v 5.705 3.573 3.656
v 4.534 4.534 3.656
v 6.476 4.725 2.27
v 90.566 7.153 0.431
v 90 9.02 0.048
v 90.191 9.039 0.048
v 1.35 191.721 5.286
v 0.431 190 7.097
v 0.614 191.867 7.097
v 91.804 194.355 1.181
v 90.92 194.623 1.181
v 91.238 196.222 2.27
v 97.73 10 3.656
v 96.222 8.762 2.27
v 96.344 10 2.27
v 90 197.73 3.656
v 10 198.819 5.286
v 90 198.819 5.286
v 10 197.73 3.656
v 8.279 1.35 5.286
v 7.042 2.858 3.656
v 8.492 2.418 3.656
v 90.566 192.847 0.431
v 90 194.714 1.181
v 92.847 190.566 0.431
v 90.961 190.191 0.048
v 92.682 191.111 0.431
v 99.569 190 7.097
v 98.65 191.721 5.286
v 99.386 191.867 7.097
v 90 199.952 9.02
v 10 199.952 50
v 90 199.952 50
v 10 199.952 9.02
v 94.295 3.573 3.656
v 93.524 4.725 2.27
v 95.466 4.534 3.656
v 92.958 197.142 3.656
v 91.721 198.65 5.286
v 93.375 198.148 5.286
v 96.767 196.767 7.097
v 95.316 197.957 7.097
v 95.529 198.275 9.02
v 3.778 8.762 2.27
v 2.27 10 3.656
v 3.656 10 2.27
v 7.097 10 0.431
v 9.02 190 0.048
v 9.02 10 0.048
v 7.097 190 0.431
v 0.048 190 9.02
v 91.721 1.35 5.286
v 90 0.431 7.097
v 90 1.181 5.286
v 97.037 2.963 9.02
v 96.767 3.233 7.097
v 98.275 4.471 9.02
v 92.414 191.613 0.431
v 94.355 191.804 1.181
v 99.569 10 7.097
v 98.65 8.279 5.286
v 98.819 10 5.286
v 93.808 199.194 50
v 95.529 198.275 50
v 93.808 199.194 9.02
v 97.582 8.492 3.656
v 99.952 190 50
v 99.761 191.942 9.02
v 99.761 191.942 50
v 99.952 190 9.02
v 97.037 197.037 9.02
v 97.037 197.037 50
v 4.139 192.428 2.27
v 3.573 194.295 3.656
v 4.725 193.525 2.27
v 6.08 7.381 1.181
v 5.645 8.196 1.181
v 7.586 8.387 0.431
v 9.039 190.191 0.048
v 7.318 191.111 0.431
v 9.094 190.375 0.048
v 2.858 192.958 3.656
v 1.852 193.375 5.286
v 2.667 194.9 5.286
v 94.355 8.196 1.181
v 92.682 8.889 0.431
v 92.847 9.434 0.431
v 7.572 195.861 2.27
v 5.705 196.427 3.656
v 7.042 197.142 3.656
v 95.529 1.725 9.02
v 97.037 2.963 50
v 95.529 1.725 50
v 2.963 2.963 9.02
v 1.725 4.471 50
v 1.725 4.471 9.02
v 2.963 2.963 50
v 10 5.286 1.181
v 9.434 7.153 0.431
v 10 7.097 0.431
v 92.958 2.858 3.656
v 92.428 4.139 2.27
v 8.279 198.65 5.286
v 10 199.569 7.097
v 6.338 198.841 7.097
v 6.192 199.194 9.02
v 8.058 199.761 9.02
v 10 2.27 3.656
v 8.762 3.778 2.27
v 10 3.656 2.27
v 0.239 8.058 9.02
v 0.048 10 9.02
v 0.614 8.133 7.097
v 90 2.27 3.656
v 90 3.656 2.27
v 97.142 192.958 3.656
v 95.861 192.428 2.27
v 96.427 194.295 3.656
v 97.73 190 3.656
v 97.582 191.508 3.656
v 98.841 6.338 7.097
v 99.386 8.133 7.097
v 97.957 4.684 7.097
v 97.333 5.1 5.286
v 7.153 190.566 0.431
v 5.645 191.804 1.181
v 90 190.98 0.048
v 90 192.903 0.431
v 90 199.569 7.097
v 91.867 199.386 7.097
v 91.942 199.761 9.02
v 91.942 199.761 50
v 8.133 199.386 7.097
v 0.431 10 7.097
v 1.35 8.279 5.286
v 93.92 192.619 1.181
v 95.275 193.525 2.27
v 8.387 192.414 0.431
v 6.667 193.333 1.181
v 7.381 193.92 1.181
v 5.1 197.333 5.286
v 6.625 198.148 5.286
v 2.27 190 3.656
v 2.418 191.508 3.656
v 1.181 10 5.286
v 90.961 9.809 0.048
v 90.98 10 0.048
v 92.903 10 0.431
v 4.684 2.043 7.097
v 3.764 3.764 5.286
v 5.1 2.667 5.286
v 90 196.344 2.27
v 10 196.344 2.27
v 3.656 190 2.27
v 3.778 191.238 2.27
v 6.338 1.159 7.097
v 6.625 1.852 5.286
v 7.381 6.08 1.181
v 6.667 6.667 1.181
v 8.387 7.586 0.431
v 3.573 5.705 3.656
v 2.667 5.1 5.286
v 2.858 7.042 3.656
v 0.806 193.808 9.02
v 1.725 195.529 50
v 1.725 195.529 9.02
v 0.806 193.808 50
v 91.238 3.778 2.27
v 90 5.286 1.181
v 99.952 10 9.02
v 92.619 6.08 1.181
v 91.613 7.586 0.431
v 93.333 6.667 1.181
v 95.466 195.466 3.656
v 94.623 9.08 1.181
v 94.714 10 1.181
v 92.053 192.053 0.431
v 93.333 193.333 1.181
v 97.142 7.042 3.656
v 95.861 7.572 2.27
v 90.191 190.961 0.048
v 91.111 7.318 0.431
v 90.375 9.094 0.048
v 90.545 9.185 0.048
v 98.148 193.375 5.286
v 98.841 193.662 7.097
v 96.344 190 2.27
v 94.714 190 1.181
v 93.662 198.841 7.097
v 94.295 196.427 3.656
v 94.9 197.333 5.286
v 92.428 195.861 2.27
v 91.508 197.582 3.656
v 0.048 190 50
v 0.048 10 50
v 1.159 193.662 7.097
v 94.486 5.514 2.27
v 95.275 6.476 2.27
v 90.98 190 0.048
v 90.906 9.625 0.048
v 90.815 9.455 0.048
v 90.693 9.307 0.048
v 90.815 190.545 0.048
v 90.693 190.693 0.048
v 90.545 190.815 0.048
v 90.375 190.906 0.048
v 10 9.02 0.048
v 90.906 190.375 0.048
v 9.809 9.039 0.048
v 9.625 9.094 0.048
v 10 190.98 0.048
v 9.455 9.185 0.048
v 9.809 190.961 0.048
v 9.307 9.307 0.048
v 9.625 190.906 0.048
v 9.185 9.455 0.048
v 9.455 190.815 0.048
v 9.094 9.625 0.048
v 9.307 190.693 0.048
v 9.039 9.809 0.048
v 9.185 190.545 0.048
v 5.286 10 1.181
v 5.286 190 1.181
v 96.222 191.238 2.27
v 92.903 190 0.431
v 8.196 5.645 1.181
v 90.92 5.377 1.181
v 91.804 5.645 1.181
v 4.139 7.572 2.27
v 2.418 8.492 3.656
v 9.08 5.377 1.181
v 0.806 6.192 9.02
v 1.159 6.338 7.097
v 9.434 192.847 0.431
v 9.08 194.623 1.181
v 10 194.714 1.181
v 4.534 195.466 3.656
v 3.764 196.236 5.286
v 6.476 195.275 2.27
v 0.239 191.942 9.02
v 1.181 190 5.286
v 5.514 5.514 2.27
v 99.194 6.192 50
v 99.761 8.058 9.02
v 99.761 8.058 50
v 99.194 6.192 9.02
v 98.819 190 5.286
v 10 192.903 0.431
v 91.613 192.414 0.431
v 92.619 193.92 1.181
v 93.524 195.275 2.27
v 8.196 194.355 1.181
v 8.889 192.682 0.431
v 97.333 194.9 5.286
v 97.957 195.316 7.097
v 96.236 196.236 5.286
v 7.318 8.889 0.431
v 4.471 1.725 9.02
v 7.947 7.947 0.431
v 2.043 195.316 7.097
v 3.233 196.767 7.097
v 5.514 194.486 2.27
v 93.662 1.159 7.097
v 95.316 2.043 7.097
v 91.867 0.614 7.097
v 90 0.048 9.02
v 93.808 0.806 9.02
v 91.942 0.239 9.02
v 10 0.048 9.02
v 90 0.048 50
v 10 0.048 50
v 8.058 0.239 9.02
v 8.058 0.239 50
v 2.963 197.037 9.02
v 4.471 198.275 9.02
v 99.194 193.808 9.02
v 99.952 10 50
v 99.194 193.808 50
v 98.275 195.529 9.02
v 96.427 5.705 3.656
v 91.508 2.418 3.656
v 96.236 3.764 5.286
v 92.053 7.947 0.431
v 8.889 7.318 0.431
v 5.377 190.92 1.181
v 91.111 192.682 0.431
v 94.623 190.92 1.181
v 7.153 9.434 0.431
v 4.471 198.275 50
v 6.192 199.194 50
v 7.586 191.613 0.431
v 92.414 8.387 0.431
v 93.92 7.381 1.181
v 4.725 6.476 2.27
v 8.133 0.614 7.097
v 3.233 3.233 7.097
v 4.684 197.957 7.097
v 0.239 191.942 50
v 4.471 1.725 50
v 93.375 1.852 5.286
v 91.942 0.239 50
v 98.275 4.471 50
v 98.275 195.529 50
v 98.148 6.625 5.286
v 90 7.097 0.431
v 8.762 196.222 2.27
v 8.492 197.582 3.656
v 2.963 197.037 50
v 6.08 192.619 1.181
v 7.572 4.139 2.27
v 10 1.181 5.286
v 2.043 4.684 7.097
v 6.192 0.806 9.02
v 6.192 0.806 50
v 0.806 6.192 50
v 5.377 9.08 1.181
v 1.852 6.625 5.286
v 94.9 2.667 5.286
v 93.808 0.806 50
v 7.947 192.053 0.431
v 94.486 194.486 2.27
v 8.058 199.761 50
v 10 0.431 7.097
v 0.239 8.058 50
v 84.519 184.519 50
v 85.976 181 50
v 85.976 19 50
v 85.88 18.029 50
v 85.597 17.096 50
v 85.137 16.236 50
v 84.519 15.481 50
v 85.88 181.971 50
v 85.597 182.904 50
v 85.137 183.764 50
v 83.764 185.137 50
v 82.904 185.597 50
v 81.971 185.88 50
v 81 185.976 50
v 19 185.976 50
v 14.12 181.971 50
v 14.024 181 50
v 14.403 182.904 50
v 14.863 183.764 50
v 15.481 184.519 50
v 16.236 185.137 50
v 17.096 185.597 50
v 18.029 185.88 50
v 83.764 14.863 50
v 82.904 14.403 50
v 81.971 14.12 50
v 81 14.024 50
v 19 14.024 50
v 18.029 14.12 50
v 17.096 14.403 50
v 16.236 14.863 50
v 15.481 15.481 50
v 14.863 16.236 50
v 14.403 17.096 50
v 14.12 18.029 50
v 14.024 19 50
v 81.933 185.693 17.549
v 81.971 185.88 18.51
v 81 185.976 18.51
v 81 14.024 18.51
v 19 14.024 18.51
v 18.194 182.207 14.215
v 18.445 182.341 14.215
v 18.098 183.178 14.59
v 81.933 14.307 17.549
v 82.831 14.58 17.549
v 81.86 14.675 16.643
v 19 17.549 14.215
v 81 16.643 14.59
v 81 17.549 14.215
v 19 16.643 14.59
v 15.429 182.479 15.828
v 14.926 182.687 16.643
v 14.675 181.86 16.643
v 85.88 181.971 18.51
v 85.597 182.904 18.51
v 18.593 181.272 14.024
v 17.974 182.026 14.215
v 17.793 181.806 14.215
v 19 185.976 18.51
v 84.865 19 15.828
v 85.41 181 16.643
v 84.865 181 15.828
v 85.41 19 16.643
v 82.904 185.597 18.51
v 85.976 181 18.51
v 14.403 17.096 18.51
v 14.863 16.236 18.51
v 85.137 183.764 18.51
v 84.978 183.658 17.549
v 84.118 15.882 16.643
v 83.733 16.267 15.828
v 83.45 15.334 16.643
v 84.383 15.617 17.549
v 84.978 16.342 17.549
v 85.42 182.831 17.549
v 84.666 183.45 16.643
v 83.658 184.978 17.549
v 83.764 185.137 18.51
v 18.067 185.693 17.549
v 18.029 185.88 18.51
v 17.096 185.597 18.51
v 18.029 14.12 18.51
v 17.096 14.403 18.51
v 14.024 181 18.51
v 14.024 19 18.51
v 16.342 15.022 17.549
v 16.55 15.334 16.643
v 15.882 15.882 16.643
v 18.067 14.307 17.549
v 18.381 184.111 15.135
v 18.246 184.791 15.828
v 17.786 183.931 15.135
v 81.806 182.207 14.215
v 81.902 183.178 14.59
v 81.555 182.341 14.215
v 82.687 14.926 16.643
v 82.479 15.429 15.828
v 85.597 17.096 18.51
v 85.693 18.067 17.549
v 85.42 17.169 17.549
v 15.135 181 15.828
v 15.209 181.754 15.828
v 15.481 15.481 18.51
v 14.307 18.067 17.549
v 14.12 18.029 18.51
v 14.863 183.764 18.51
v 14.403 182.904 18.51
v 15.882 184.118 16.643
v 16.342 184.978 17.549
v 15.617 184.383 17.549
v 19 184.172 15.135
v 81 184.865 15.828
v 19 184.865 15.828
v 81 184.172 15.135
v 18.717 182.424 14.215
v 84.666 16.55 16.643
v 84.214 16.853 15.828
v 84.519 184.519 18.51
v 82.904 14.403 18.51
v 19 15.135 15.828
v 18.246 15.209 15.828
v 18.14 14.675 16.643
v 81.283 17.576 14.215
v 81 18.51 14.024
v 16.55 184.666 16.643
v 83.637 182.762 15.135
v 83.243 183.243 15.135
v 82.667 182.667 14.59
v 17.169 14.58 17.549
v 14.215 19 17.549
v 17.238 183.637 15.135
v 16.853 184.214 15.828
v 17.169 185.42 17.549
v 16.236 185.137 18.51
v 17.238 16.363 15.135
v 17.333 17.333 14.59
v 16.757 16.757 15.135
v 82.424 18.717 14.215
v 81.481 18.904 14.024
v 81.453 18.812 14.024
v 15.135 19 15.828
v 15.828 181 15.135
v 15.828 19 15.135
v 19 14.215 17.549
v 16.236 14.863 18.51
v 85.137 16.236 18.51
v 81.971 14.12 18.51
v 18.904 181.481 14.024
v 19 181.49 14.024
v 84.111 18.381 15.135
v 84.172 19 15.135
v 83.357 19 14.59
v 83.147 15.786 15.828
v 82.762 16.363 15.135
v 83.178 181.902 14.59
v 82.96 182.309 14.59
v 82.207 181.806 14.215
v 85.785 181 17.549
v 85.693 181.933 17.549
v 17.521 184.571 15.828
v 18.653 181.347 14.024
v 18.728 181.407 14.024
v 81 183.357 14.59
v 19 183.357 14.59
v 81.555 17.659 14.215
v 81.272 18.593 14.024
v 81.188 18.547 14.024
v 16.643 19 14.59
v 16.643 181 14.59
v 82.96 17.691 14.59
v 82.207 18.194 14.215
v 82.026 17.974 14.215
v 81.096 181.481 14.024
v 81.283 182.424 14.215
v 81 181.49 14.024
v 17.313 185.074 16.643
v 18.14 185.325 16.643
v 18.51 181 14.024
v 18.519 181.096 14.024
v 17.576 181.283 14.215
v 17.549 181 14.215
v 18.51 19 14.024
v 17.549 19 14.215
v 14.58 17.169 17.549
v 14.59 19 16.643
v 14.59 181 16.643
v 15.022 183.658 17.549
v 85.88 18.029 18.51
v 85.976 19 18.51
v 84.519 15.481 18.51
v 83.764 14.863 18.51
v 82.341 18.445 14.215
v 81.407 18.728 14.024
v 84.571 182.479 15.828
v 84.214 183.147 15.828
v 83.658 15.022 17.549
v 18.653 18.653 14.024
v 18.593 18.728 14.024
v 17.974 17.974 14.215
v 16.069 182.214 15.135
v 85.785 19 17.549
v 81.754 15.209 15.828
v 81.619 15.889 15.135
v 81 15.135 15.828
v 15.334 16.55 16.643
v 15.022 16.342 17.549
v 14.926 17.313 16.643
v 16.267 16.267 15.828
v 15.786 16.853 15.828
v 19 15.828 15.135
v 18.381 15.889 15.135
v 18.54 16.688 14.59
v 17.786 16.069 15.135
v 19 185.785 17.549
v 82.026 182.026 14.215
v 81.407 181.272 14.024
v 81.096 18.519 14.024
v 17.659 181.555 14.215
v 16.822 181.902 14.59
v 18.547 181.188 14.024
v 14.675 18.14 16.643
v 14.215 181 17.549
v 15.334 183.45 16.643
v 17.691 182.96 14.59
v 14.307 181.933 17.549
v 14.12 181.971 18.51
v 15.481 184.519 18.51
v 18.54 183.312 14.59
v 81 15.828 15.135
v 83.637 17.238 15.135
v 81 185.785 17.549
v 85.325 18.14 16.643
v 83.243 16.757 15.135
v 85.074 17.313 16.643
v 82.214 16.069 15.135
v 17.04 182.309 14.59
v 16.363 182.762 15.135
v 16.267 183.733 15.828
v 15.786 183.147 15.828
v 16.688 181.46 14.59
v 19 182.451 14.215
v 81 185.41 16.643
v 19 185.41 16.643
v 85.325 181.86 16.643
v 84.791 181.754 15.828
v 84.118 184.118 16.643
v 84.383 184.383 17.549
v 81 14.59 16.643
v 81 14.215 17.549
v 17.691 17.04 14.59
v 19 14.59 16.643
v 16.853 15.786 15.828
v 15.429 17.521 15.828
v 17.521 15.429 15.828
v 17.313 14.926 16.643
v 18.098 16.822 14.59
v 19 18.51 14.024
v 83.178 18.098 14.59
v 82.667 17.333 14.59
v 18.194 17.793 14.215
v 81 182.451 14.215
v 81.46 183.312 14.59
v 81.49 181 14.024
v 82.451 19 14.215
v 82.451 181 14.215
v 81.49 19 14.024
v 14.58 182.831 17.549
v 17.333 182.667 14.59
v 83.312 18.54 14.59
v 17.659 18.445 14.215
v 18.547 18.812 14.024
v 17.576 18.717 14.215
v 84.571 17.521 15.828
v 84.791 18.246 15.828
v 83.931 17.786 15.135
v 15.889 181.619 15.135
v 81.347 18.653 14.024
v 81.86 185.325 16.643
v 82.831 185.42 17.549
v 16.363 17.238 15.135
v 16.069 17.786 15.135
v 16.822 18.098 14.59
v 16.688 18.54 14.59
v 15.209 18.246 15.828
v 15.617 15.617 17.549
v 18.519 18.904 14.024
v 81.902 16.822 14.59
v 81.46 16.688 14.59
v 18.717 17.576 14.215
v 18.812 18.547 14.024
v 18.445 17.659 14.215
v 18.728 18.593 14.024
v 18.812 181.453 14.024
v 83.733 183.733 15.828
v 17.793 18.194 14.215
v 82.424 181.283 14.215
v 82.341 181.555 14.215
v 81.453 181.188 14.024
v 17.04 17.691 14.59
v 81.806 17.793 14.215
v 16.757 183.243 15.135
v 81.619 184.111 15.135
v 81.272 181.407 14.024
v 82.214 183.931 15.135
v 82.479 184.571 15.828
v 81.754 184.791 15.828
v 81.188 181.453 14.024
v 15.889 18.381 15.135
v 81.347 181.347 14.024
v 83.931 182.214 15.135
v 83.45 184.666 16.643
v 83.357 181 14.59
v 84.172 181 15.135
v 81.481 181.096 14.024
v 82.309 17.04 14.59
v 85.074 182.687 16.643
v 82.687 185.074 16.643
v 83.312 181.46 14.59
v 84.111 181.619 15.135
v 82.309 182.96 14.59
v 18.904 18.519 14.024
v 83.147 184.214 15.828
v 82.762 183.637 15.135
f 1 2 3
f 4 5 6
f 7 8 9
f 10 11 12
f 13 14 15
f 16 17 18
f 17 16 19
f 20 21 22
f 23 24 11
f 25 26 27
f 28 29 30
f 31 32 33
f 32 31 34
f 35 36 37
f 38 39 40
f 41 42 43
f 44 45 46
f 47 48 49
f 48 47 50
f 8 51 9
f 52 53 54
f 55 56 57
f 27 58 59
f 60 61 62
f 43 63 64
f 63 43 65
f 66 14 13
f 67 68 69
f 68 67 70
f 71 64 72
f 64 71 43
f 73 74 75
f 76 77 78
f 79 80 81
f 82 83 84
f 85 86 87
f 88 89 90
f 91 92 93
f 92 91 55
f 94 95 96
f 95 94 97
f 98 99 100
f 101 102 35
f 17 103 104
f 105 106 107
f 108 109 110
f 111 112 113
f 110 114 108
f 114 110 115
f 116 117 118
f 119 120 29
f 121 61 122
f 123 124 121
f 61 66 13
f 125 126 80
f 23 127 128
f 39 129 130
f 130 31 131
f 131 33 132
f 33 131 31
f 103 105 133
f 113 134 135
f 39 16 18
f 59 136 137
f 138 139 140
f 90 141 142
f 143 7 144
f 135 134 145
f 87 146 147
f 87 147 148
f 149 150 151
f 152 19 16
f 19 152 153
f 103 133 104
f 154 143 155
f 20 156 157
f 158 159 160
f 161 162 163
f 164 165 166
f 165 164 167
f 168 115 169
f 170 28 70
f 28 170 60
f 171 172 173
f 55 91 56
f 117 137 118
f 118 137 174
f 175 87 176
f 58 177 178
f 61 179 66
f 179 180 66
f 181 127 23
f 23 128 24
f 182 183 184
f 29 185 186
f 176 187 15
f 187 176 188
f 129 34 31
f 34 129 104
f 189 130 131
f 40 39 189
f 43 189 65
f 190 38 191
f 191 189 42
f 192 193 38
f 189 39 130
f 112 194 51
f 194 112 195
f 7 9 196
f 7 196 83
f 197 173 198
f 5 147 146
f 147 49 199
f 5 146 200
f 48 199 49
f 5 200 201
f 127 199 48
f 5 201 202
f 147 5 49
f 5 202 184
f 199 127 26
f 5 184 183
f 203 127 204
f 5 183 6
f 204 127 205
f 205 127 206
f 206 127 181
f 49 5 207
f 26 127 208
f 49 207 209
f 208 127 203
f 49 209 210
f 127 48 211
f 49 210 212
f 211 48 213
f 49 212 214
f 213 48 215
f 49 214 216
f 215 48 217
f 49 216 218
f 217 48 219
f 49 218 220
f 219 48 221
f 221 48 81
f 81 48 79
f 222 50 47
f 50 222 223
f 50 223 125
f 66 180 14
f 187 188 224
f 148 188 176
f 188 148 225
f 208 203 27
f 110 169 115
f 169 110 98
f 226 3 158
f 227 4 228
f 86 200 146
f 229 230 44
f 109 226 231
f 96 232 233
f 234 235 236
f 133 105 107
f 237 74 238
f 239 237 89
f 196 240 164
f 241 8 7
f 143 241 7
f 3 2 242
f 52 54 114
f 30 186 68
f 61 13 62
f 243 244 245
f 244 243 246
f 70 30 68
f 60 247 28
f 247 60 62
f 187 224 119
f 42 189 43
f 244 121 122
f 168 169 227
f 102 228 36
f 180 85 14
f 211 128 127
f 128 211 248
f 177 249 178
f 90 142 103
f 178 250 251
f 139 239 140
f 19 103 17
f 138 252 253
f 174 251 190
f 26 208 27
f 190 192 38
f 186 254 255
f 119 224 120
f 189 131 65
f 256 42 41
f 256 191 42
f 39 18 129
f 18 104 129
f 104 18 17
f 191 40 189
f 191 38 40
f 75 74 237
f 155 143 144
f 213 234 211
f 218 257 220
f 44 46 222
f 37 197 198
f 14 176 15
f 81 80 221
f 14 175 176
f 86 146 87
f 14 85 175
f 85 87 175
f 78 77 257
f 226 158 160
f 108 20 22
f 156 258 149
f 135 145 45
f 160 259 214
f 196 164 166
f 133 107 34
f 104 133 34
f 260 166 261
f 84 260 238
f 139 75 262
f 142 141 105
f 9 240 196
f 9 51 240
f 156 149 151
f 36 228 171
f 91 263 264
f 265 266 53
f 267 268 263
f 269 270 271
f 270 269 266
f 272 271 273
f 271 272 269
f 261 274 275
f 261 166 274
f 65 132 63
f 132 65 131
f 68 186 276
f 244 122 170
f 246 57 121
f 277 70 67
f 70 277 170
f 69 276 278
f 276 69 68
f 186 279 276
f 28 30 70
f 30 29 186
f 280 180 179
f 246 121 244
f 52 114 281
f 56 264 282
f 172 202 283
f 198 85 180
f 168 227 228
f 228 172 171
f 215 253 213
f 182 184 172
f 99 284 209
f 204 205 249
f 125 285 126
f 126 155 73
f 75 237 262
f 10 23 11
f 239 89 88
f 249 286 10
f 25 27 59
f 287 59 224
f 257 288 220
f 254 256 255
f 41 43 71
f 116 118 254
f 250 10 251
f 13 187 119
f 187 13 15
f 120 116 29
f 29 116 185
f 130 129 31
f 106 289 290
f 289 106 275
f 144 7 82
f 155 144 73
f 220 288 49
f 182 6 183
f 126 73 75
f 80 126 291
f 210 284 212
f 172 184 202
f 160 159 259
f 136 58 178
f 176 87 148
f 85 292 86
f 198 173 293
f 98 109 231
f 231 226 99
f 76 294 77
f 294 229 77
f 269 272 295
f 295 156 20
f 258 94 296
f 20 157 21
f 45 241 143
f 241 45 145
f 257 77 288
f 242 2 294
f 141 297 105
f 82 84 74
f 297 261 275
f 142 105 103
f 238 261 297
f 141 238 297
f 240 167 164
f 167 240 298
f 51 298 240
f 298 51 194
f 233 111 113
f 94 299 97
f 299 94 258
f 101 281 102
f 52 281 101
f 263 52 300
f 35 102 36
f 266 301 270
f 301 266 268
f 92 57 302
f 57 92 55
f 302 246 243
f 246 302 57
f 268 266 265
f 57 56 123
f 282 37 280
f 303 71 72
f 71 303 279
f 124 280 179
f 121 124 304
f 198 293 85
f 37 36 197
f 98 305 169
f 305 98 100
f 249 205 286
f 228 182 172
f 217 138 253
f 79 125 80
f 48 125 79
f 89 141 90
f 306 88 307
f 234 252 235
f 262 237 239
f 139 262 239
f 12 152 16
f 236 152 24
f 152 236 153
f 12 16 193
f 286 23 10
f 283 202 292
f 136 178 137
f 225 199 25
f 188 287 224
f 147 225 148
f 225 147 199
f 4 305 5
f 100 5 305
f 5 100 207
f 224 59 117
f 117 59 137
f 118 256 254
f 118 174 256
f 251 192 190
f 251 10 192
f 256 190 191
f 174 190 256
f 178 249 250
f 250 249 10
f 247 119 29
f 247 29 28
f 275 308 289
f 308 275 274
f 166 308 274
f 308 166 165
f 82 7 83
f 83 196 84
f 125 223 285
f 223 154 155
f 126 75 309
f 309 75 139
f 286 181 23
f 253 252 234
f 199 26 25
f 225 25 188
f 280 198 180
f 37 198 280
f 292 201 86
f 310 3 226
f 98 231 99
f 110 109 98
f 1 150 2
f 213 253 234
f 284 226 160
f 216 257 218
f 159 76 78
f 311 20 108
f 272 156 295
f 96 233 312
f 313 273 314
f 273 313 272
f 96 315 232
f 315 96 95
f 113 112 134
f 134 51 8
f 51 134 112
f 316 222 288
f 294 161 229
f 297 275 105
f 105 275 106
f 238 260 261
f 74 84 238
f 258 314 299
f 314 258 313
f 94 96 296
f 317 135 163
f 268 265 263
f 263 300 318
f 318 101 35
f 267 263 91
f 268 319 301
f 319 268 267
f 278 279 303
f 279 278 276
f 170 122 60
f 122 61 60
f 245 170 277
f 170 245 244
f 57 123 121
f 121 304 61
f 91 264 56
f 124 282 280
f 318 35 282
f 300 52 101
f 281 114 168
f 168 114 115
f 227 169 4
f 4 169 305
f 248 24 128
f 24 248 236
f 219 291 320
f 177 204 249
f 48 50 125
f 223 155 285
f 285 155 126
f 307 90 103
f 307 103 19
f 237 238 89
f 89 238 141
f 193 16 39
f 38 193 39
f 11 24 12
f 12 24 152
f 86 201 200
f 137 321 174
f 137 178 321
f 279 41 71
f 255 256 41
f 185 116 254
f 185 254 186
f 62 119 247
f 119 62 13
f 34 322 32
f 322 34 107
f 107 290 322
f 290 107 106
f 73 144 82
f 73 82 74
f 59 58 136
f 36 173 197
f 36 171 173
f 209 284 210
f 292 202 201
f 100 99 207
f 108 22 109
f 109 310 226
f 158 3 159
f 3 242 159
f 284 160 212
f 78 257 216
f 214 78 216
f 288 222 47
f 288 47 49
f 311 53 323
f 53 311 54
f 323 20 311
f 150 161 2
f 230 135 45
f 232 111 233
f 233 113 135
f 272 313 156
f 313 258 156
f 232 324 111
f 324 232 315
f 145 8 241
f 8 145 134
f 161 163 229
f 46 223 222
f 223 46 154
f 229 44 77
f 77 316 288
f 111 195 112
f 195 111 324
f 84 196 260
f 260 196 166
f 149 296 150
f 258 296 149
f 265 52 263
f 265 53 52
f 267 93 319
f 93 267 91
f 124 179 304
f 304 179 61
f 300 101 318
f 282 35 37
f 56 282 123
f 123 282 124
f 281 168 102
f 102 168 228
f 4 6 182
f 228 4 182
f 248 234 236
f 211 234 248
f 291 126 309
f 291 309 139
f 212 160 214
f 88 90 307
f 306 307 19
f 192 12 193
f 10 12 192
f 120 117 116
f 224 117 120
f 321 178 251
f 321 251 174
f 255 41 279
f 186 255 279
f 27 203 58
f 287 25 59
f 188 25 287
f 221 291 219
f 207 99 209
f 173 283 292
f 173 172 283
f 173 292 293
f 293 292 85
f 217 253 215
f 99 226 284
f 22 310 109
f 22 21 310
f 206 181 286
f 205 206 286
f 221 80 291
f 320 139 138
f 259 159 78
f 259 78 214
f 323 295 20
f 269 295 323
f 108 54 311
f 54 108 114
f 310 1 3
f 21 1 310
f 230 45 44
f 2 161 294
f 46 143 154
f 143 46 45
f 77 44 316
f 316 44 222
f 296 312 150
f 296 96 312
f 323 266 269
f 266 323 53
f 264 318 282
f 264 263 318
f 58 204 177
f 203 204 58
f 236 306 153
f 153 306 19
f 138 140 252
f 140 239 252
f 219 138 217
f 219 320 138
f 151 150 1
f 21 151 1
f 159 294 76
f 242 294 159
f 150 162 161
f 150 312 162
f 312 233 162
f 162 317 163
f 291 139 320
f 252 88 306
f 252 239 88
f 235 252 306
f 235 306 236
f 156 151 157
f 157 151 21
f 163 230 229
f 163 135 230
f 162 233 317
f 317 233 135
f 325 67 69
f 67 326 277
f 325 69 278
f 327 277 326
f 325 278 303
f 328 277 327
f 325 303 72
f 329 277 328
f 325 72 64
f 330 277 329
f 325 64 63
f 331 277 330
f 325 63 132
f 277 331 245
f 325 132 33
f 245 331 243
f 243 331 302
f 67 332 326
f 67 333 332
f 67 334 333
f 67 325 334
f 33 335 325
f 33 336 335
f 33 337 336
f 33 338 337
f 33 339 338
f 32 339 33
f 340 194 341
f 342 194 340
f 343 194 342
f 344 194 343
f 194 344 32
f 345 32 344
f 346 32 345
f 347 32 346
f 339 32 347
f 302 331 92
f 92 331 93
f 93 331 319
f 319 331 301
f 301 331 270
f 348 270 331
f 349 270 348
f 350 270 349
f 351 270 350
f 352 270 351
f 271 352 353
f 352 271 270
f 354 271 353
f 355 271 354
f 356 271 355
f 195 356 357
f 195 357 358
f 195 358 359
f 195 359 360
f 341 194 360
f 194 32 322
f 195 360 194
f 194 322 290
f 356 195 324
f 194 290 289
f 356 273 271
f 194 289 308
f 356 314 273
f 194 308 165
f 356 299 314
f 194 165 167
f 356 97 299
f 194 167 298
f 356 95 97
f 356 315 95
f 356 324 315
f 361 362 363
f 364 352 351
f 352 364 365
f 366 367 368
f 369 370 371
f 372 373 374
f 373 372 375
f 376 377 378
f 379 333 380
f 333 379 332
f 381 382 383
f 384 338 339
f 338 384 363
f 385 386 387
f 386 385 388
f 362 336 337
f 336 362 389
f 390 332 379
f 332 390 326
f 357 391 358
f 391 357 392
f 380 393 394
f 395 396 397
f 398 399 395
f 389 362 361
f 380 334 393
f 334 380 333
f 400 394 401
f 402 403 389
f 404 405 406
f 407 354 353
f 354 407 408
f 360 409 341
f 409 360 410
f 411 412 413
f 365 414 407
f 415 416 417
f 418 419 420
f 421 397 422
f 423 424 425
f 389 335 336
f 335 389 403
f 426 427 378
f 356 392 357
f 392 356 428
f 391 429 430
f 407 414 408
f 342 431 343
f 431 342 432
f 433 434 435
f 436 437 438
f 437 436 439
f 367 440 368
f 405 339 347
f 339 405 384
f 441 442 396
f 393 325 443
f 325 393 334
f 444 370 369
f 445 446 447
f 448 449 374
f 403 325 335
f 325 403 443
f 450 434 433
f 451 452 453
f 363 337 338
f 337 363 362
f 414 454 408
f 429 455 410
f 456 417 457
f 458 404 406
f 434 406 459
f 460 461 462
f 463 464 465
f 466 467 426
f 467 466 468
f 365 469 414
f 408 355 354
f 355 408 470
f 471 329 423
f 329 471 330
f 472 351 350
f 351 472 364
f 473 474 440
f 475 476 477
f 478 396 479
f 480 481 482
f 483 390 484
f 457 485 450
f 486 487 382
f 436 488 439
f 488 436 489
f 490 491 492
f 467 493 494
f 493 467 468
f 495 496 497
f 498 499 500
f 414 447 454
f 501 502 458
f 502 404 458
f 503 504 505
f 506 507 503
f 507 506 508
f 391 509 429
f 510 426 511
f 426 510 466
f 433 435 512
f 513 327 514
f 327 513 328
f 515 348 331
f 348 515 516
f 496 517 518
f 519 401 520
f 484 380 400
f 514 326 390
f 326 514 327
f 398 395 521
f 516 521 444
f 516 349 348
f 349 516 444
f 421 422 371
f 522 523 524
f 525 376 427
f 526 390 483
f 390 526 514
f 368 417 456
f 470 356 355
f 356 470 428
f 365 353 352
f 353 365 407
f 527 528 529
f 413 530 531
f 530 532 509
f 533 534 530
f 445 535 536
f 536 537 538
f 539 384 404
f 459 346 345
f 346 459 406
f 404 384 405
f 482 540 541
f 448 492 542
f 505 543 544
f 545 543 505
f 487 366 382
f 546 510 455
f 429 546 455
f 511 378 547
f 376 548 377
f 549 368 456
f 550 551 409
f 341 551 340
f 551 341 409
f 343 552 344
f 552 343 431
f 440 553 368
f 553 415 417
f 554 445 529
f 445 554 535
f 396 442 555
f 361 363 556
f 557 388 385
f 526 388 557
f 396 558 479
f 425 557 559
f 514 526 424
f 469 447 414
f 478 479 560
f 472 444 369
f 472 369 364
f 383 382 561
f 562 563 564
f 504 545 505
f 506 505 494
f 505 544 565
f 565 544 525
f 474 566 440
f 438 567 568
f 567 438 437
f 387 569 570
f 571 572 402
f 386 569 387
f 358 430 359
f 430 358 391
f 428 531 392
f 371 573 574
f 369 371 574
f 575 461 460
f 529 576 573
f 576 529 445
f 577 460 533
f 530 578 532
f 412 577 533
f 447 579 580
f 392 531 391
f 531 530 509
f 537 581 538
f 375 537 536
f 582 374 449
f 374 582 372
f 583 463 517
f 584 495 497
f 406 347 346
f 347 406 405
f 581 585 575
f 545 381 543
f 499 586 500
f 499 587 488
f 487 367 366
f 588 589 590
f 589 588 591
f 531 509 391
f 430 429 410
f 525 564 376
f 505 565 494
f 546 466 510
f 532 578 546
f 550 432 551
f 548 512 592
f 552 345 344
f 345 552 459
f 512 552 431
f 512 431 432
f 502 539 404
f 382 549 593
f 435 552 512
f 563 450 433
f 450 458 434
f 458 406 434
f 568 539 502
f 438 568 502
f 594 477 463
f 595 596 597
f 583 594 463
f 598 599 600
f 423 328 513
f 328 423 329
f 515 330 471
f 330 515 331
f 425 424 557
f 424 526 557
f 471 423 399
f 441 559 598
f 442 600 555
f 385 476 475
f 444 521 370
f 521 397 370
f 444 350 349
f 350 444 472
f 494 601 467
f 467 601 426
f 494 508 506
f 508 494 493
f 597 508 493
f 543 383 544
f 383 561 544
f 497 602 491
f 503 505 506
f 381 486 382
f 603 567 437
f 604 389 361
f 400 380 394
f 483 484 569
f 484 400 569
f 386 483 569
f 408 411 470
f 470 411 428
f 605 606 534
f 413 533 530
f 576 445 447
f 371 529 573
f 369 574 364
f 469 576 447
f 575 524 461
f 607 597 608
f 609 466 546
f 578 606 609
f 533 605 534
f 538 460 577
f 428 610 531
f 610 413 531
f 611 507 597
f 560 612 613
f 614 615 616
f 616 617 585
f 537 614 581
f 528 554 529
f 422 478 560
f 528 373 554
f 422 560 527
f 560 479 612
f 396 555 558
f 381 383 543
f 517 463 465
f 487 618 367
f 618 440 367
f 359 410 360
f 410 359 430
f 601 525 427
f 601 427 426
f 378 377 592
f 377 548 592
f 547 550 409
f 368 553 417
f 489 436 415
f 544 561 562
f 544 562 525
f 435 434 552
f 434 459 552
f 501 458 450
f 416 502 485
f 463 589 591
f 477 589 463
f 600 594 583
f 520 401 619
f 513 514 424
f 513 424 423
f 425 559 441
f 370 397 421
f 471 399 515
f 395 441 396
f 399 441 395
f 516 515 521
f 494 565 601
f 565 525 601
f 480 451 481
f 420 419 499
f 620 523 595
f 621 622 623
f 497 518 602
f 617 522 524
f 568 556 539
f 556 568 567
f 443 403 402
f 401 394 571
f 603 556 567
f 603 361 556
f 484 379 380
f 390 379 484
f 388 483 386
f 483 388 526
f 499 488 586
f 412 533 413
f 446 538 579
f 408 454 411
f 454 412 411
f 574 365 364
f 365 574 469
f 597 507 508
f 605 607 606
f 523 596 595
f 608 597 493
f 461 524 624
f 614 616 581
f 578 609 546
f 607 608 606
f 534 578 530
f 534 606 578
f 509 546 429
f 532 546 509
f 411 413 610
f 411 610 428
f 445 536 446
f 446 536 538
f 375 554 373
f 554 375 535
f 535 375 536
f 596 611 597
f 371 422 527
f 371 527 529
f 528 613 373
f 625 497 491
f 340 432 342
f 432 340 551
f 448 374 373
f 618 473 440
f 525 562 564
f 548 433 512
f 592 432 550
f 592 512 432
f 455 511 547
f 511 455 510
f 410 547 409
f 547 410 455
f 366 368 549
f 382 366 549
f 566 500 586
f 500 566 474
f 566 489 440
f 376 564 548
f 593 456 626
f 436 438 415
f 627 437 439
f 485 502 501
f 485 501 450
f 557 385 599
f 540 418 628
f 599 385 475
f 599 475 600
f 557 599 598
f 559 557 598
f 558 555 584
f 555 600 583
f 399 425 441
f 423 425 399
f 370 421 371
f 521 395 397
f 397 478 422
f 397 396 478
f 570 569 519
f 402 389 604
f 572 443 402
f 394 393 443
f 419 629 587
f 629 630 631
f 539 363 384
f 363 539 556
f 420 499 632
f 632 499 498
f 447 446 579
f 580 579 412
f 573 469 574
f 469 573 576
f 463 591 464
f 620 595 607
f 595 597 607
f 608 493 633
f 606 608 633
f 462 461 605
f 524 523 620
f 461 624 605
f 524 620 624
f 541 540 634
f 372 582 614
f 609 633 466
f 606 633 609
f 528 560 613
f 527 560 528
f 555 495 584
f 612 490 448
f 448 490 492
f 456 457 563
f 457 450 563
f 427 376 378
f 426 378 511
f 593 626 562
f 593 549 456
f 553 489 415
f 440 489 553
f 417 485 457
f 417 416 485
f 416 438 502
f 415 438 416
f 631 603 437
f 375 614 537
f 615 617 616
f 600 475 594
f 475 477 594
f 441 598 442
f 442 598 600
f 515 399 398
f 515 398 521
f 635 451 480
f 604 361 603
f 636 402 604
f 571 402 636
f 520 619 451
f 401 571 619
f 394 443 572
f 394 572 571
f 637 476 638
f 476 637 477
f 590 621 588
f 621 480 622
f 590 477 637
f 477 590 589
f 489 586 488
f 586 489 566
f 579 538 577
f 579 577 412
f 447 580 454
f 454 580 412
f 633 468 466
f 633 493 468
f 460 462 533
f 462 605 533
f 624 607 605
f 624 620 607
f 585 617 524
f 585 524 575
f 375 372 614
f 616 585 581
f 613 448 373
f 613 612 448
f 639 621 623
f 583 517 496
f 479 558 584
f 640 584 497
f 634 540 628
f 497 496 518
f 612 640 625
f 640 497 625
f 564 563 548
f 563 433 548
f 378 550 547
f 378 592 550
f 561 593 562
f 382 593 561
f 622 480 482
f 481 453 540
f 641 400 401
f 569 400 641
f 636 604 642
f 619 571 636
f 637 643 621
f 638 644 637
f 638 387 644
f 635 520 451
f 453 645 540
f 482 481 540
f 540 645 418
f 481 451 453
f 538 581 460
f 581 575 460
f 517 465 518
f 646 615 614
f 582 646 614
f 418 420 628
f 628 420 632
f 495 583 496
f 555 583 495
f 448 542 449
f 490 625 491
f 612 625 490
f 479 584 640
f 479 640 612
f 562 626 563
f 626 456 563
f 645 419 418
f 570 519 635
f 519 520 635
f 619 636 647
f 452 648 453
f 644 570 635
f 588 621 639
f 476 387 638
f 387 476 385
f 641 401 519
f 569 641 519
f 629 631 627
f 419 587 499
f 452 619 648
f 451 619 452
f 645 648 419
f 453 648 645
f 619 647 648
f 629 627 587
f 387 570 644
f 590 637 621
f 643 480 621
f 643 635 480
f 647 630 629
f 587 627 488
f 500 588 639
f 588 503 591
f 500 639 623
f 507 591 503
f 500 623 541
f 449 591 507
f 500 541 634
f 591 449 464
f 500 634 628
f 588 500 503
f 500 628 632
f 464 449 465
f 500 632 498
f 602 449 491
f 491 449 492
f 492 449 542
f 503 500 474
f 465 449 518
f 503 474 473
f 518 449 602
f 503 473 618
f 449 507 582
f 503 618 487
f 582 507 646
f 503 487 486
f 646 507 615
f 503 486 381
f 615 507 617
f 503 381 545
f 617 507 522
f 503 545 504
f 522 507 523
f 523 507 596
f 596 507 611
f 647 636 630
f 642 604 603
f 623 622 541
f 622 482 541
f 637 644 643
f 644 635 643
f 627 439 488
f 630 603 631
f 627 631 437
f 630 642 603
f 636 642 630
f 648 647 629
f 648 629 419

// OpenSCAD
// file: pw_primitives.scad
module hollow_cube(length, width, height, wall_t) {
    difference() {
        two_t = wall_t*2;
        cube([length, width, height]);
        translate([wall_t, wall_t, -0.1]) 
          cube([length-two_t, width-two_t, height+0.2]);
    }
}

module hollow_cylinder(width, height, wall_t) {
    difference() {
        two_t = wall_t*2;
        cylinder(h=height, r=width/2);
        translate([0, 0, -0.1])
          cylinder(h=height+0.2, r=(width-two_t)/2);
    }
}

module rounded_box(length, width, height, outer_r, inner_r, thickness) {
    outer_d = outer_r*2;
    inner_t = thickness+inner_r;
    inner_d = outer_d+inner_t*2;
    translate([outer_r, outer_r, outer_r]) difference() {
        // outer rounded rectangle
        minkowski() {
            cube([length-outer_d, width-outer_d, height-outer_r]);
            sphere(r=outer_r);
        };
        // top face
        translate([-outer_r, -outer_r, height-outer_r]) 
          cube([length+2*outer_r, width+2*outer_r, outer_r]);
        // inner rounded rectangle
        translate([inner_t, inner_t, inner_t]) minkowski() {
            cube([length-inner_d, width-inner_d, height]);
            sphere(r=inner_r);
        };
    }
}

module ring_rt(height, radius, thickness) { difference() {
    // For when you know the outer radius and the wall thickness.
    cylinder(h=height, r=radius);
    translate([0, 0, -0.05]) 
      cylinder(h=height+0.1, r=max(radius-thickness, 0));
}};

module ring_oi(height, o_radius, i_radius) { difference() {
    // For when you know the outer and inner radius but not the wall thickness.
    cylinder(h=height, r=o_radius);
    translate([0, 0, -0.05]) 
      cylinder(h=height+0.1, r=i_radius);   
}};

module hollow_cone_rt(height, bottom_radius, top_radius, thickness) { difference() {
    // For when you know the outer radii and the wall thickness.
    cylinder(h=height, r1=bottom_radius, r2=top_radius);
    translate([0, 0, -0.05]) cylinder(
        h=height+0.1, 
        r1=max(bottom_radius-thickness, 0), r2=max(top_radius-thickness, 0)
    );
}};

module hollow_cone_oi(
    height, o_bot_radius, i_bot_radius, o_top_radius, i_top_radius,
) { difference() {
    // For when you know the outer and inner radii but not the wall thickness.
    cylinder(h=height, r1=o_bot_radius, r2=o_top_radius);
    translate([0, 0, -0.05]) 
      cylinder(h=height+0.1, r1=i_bot_radius, r2=i_top_radius);
}};
// main file
$fn=32;

include <pw_primitives.scad>;

rounded_box(100, 200, 50, 10, 5, 4);
